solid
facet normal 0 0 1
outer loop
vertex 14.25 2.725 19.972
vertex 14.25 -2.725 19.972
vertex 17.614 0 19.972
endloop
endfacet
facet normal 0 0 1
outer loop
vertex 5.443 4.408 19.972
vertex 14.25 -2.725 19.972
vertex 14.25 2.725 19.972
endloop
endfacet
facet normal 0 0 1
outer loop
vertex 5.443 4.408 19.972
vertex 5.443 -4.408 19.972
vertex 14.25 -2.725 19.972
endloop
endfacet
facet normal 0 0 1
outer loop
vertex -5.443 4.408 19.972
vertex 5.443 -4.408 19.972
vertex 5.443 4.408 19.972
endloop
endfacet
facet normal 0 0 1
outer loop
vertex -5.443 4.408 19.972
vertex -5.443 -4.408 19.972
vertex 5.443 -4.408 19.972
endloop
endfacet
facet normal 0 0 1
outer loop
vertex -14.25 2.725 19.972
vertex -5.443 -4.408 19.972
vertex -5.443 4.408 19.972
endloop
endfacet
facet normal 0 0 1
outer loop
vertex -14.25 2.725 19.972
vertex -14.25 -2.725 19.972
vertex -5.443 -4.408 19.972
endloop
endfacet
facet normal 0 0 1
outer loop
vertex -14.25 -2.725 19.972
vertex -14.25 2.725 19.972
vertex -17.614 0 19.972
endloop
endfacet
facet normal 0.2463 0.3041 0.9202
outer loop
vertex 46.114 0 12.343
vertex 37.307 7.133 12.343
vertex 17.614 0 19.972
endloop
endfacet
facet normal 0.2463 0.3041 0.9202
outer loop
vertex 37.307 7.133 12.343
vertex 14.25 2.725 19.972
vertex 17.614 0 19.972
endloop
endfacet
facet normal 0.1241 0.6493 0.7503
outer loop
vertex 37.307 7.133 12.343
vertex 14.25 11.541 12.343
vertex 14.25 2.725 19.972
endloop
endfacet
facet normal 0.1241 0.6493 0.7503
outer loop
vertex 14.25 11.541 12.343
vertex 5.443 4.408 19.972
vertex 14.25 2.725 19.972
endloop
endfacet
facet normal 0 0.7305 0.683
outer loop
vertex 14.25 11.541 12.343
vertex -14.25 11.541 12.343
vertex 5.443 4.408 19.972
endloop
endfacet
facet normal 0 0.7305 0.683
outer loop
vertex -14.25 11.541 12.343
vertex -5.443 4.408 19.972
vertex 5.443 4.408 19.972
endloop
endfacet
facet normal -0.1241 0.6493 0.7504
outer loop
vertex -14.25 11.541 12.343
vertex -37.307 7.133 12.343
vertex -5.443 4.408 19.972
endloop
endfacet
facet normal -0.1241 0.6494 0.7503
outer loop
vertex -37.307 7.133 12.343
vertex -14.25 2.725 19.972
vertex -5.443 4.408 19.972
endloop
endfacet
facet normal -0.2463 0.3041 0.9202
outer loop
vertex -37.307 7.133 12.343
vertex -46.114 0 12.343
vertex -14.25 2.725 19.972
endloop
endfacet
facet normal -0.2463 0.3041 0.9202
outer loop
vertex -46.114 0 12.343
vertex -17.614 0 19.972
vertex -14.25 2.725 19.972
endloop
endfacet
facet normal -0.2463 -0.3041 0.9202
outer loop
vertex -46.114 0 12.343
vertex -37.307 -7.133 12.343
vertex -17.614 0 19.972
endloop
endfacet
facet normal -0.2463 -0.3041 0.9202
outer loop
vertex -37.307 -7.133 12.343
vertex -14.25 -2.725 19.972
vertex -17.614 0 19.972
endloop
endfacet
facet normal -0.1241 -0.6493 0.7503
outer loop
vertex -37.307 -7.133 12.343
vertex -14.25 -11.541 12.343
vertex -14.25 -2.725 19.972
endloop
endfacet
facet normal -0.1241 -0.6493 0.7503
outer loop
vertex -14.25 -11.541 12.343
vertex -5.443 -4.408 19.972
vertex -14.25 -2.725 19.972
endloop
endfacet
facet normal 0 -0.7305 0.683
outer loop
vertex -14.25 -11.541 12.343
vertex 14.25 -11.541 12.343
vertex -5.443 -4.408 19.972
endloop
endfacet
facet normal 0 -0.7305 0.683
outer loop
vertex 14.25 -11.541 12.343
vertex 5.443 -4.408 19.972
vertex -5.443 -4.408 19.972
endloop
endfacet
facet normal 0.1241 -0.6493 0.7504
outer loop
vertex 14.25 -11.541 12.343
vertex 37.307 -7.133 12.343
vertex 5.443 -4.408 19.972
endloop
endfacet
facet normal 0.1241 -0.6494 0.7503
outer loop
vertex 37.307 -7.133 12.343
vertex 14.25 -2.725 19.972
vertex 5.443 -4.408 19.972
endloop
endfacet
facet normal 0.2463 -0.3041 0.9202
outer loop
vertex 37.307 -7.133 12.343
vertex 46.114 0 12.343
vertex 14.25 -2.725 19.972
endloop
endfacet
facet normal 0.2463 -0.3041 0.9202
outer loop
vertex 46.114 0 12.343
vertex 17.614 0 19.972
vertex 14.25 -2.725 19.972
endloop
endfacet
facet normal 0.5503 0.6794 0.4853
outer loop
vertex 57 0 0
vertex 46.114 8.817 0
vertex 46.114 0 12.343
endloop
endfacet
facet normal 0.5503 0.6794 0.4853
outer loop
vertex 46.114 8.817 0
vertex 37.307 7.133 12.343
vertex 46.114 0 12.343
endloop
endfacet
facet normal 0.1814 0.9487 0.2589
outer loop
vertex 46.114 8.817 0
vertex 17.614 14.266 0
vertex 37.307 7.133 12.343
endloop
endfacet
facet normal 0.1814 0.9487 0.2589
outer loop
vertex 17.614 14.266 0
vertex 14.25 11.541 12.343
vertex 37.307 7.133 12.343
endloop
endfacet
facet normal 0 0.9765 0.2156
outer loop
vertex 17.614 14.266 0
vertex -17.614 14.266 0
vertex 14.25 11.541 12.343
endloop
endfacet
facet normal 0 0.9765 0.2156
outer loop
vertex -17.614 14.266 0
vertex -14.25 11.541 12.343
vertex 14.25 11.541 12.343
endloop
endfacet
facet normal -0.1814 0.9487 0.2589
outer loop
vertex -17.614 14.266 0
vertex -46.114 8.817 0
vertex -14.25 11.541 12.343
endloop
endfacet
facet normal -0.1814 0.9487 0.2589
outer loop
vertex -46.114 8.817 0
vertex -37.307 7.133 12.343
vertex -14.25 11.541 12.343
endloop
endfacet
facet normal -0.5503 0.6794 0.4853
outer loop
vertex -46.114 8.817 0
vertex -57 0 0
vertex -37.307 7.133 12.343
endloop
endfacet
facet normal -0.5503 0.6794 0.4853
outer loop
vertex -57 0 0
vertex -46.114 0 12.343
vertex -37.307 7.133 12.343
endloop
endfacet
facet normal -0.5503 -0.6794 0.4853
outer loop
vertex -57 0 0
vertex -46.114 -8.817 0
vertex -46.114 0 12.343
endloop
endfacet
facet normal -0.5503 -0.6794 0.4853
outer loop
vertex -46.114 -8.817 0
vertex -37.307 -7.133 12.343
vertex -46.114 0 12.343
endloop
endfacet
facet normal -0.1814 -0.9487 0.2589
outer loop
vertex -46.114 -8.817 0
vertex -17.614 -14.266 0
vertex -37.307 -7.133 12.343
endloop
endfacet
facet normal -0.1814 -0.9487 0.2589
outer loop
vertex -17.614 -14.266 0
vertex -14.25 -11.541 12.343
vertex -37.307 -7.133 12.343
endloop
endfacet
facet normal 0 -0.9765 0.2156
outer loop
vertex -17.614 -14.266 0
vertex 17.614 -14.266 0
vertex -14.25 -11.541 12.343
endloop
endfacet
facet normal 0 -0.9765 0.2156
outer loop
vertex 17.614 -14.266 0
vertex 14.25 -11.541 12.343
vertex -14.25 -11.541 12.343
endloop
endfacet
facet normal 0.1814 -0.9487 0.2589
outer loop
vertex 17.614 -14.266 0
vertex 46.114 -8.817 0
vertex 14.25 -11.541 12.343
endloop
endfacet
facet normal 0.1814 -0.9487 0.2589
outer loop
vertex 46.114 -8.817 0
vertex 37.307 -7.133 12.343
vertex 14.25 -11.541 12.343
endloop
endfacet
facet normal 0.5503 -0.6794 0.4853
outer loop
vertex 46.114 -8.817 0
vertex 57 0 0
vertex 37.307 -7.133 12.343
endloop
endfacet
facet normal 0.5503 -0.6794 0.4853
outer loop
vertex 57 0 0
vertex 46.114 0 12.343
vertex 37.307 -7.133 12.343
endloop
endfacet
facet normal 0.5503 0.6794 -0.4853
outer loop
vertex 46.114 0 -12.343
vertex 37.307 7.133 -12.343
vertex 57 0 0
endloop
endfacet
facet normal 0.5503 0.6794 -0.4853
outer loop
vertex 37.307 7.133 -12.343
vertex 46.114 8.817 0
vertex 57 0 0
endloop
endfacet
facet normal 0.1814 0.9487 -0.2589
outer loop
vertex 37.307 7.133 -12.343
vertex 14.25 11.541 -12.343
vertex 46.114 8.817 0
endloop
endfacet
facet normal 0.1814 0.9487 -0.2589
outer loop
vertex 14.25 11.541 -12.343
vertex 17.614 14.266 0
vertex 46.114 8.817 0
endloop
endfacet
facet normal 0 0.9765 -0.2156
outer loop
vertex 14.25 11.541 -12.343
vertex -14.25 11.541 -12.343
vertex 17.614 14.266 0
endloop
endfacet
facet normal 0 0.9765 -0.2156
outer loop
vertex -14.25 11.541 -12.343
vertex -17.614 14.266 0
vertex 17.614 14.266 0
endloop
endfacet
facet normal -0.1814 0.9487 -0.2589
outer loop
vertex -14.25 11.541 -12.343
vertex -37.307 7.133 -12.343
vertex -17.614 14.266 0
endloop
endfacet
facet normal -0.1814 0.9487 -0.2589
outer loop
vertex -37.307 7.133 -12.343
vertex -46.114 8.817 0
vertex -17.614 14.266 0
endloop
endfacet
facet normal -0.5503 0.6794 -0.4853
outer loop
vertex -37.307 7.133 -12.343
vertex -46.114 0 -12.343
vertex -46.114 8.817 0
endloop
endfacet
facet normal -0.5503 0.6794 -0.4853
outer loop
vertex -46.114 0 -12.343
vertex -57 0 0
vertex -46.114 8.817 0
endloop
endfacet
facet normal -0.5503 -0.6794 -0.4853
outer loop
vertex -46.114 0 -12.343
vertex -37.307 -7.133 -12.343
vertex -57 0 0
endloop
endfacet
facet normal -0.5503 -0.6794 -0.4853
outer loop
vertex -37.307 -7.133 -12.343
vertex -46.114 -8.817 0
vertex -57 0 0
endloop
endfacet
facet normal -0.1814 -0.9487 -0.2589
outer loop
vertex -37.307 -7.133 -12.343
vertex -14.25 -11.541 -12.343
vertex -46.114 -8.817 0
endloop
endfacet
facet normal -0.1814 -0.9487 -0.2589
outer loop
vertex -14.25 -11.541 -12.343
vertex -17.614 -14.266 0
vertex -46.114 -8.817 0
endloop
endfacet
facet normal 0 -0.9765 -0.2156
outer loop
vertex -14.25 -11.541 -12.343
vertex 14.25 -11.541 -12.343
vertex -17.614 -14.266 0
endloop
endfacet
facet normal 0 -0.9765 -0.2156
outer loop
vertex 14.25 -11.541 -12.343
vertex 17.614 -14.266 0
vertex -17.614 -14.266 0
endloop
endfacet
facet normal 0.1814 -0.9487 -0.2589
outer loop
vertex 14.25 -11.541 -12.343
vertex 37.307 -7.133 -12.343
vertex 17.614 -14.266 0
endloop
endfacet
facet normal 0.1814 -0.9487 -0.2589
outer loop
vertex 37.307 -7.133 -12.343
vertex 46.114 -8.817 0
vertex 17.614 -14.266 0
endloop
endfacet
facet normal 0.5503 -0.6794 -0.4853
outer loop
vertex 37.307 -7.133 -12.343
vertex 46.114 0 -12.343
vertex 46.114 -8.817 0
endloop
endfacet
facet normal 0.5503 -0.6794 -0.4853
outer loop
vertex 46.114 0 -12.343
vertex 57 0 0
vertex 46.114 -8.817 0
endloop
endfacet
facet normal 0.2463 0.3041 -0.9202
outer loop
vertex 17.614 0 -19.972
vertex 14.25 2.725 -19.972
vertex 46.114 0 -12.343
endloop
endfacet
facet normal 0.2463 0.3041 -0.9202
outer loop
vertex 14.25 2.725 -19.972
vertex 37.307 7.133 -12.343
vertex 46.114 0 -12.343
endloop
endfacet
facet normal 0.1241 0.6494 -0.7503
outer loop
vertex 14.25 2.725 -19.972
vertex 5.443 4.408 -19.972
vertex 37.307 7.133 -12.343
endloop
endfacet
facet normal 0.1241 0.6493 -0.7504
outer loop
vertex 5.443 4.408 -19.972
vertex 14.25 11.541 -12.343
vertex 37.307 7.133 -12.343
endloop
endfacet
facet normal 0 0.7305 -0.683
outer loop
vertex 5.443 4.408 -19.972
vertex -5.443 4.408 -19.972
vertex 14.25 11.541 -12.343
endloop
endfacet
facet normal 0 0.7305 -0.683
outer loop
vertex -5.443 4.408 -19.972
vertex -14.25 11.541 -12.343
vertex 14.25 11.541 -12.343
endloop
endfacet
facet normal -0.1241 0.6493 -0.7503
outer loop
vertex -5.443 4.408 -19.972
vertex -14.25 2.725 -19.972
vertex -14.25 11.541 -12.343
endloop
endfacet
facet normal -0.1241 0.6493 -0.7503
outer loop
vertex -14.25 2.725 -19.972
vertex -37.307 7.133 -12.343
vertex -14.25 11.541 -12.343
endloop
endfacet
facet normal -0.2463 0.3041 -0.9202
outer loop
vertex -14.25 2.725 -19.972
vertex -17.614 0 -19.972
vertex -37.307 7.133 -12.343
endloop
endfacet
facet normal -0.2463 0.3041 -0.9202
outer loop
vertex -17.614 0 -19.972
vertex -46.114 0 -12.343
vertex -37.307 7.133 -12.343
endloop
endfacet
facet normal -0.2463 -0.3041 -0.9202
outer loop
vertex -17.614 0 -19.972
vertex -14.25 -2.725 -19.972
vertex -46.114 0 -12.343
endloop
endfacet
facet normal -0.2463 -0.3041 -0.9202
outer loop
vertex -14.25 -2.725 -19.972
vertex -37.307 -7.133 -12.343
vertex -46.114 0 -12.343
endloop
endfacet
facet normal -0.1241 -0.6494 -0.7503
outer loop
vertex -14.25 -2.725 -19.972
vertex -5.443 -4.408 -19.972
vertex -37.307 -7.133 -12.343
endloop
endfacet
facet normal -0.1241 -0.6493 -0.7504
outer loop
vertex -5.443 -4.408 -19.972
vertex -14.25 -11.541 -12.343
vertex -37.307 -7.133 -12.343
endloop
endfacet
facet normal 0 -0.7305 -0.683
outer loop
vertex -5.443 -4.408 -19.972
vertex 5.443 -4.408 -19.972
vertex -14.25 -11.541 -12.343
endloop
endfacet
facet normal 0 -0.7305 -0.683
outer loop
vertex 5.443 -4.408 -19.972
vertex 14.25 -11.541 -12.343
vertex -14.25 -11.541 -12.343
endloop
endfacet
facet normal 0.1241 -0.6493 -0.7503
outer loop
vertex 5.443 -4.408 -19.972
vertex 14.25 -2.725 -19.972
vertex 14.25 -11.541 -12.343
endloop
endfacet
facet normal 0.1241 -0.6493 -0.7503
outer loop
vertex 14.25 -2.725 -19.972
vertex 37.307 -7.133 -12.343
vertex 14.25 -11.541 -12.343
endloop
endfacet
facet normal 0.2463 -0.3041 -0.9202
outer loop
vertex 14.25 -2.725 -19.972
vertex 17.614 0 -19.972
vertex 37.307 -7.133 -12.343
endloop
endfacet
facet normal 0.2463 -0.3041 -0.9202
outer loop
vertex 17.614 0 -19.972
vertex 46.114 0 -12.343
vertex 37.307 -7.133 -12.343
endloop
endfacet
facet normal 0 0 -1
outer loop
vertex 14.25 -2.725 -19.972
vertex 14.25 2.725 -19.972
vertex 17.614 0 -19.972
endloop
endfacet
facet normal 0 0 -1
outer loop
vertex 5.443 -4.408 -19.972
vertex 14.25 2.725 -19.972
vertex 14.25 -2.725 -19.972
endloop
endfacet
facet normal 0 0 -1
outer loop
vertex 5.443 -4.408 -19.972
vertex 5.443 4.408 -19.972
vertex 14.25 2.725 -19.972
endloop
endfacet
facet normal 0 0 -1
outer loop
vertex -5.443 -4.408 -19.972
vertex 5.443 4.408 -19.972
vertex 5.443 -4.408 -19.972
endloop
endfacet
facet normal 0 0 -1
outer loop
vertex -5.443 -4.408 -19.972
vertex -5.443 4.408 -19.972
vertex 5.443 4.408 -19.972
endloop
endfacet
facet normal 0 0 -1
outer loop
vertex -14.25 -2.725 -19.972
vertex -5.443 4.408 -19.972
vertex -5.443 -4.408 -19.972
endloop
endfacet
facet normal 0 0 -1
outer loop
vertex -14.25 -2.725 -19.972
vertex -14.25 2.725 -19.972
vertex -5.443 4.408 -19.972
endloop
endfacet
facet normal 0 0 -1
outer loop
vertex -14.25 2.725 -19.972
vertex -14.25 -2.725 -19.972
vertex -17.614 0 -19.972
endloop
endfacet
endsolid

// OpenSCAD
// Generated by SolidPython 1.0.1 on 2020-07-29 00:46:53


scale(v = [19, 5, 7]) {
	sphere(r = 3);
}
/***********************************************
*********      SolidPython code:      **********
************************************************
 
# import packages: SolidPython
from solid import *
from solid.utils import *
from itertools import chain, combinations, permutations


class Resize:

    def __init__(self, scad_file):
        self.scad_file = scad_file
        #self.scad_file = import_scad(scad_file)
        # cone/cylinder param:
        self.r1 = 0
        self.r2 = 0
        self.h = 0
        # rectangular prism param:
        self.w = 0
        self.l = 0
        # ellipse param:
        self.r = 0

    # import OpenScad code (file name corresponds to shape)


    # classify shape + parameters
    def assign(self, param1, param2, param3):
        if self.scad_file == 'cone.scad':
            self.r1 = param1
            self.r2 = param2
            self.h = param3
        elif self.scad_file == 'cylinder.scad':
            self.r1 = param1
            self.r2 = param2
            self.h = param3
        elif self.scad_file == 'rectangularPrism.scad':
            self.h = param1
            self.l = param2
            self.w = param3
        else:
            self.r = param1
            self.h = param2

    # resize parameters
    def iterate(self):
        x = range(3, 20, 2)
        i = 1
        if self.scad_file == 'cone.scad':
            tempList = list(permutations(x, 2))
            for temp in tempList:
                param1 = temp[0]
                param2 = temp[1]
                filepath = 'produced_scad_files/' + 'cone' + str(param1) + '_' + str(param2) + '_' + '.scad'
                scad_render_to_file(cylinder(h=param1, r1=param2, r2=0), filepath)

        elif self.scad_file == 'cylinder.scad':
            tempList = list(permutations(x, 3))
            for temp in tempList:
                param1 = temp[0]
                param2 = temp[1]
                filepath = 'produced_scad_files/' + 'cylinder' + str(param1) + '_' + str(param2) + '_' + '.scad'
                scad_render_to_file(cylinder(h=param1, r1=param2, r2=param2), filepath)

        elif self.scad_file == 'rectangularPrism.scad':
            tempList = list(permutations(x, 3))
            for temp in tempList:
                param1 = temp[0]
                param2 = temp[1]
                param3 = temp[2]
                filepath = 'produced_scad_files/' + 'rectangularPrism' + str(param1) + '_' + str(param2) + '_' + str(
                    param3) + '.scad'
                scad_render_to_file(cube(size=(param1, param2, param3)), filepath)

        elif self.scad_file == 'ellipse.scad':
            tempList = list(permutations(x, 4))
            for temp in tempList:
                param1 = temp[0]
                param2 = temp[1]
                param3 = temp[2]
                param4 = temp[3]
                filepath = 'produced_scad_files/' + 'ellipse' + str(param1) + '_' + str(param2) + '_' + str(param3) + '_' + str(param4) + '.scad'
                scad_render_to_file(scale([param1, param2, param3])(sphere(r=param4)), filepath)

    def render_to_scadfile(self):
        scad_render_to_file(scad, 'example.scad') 
 
************************************************/
